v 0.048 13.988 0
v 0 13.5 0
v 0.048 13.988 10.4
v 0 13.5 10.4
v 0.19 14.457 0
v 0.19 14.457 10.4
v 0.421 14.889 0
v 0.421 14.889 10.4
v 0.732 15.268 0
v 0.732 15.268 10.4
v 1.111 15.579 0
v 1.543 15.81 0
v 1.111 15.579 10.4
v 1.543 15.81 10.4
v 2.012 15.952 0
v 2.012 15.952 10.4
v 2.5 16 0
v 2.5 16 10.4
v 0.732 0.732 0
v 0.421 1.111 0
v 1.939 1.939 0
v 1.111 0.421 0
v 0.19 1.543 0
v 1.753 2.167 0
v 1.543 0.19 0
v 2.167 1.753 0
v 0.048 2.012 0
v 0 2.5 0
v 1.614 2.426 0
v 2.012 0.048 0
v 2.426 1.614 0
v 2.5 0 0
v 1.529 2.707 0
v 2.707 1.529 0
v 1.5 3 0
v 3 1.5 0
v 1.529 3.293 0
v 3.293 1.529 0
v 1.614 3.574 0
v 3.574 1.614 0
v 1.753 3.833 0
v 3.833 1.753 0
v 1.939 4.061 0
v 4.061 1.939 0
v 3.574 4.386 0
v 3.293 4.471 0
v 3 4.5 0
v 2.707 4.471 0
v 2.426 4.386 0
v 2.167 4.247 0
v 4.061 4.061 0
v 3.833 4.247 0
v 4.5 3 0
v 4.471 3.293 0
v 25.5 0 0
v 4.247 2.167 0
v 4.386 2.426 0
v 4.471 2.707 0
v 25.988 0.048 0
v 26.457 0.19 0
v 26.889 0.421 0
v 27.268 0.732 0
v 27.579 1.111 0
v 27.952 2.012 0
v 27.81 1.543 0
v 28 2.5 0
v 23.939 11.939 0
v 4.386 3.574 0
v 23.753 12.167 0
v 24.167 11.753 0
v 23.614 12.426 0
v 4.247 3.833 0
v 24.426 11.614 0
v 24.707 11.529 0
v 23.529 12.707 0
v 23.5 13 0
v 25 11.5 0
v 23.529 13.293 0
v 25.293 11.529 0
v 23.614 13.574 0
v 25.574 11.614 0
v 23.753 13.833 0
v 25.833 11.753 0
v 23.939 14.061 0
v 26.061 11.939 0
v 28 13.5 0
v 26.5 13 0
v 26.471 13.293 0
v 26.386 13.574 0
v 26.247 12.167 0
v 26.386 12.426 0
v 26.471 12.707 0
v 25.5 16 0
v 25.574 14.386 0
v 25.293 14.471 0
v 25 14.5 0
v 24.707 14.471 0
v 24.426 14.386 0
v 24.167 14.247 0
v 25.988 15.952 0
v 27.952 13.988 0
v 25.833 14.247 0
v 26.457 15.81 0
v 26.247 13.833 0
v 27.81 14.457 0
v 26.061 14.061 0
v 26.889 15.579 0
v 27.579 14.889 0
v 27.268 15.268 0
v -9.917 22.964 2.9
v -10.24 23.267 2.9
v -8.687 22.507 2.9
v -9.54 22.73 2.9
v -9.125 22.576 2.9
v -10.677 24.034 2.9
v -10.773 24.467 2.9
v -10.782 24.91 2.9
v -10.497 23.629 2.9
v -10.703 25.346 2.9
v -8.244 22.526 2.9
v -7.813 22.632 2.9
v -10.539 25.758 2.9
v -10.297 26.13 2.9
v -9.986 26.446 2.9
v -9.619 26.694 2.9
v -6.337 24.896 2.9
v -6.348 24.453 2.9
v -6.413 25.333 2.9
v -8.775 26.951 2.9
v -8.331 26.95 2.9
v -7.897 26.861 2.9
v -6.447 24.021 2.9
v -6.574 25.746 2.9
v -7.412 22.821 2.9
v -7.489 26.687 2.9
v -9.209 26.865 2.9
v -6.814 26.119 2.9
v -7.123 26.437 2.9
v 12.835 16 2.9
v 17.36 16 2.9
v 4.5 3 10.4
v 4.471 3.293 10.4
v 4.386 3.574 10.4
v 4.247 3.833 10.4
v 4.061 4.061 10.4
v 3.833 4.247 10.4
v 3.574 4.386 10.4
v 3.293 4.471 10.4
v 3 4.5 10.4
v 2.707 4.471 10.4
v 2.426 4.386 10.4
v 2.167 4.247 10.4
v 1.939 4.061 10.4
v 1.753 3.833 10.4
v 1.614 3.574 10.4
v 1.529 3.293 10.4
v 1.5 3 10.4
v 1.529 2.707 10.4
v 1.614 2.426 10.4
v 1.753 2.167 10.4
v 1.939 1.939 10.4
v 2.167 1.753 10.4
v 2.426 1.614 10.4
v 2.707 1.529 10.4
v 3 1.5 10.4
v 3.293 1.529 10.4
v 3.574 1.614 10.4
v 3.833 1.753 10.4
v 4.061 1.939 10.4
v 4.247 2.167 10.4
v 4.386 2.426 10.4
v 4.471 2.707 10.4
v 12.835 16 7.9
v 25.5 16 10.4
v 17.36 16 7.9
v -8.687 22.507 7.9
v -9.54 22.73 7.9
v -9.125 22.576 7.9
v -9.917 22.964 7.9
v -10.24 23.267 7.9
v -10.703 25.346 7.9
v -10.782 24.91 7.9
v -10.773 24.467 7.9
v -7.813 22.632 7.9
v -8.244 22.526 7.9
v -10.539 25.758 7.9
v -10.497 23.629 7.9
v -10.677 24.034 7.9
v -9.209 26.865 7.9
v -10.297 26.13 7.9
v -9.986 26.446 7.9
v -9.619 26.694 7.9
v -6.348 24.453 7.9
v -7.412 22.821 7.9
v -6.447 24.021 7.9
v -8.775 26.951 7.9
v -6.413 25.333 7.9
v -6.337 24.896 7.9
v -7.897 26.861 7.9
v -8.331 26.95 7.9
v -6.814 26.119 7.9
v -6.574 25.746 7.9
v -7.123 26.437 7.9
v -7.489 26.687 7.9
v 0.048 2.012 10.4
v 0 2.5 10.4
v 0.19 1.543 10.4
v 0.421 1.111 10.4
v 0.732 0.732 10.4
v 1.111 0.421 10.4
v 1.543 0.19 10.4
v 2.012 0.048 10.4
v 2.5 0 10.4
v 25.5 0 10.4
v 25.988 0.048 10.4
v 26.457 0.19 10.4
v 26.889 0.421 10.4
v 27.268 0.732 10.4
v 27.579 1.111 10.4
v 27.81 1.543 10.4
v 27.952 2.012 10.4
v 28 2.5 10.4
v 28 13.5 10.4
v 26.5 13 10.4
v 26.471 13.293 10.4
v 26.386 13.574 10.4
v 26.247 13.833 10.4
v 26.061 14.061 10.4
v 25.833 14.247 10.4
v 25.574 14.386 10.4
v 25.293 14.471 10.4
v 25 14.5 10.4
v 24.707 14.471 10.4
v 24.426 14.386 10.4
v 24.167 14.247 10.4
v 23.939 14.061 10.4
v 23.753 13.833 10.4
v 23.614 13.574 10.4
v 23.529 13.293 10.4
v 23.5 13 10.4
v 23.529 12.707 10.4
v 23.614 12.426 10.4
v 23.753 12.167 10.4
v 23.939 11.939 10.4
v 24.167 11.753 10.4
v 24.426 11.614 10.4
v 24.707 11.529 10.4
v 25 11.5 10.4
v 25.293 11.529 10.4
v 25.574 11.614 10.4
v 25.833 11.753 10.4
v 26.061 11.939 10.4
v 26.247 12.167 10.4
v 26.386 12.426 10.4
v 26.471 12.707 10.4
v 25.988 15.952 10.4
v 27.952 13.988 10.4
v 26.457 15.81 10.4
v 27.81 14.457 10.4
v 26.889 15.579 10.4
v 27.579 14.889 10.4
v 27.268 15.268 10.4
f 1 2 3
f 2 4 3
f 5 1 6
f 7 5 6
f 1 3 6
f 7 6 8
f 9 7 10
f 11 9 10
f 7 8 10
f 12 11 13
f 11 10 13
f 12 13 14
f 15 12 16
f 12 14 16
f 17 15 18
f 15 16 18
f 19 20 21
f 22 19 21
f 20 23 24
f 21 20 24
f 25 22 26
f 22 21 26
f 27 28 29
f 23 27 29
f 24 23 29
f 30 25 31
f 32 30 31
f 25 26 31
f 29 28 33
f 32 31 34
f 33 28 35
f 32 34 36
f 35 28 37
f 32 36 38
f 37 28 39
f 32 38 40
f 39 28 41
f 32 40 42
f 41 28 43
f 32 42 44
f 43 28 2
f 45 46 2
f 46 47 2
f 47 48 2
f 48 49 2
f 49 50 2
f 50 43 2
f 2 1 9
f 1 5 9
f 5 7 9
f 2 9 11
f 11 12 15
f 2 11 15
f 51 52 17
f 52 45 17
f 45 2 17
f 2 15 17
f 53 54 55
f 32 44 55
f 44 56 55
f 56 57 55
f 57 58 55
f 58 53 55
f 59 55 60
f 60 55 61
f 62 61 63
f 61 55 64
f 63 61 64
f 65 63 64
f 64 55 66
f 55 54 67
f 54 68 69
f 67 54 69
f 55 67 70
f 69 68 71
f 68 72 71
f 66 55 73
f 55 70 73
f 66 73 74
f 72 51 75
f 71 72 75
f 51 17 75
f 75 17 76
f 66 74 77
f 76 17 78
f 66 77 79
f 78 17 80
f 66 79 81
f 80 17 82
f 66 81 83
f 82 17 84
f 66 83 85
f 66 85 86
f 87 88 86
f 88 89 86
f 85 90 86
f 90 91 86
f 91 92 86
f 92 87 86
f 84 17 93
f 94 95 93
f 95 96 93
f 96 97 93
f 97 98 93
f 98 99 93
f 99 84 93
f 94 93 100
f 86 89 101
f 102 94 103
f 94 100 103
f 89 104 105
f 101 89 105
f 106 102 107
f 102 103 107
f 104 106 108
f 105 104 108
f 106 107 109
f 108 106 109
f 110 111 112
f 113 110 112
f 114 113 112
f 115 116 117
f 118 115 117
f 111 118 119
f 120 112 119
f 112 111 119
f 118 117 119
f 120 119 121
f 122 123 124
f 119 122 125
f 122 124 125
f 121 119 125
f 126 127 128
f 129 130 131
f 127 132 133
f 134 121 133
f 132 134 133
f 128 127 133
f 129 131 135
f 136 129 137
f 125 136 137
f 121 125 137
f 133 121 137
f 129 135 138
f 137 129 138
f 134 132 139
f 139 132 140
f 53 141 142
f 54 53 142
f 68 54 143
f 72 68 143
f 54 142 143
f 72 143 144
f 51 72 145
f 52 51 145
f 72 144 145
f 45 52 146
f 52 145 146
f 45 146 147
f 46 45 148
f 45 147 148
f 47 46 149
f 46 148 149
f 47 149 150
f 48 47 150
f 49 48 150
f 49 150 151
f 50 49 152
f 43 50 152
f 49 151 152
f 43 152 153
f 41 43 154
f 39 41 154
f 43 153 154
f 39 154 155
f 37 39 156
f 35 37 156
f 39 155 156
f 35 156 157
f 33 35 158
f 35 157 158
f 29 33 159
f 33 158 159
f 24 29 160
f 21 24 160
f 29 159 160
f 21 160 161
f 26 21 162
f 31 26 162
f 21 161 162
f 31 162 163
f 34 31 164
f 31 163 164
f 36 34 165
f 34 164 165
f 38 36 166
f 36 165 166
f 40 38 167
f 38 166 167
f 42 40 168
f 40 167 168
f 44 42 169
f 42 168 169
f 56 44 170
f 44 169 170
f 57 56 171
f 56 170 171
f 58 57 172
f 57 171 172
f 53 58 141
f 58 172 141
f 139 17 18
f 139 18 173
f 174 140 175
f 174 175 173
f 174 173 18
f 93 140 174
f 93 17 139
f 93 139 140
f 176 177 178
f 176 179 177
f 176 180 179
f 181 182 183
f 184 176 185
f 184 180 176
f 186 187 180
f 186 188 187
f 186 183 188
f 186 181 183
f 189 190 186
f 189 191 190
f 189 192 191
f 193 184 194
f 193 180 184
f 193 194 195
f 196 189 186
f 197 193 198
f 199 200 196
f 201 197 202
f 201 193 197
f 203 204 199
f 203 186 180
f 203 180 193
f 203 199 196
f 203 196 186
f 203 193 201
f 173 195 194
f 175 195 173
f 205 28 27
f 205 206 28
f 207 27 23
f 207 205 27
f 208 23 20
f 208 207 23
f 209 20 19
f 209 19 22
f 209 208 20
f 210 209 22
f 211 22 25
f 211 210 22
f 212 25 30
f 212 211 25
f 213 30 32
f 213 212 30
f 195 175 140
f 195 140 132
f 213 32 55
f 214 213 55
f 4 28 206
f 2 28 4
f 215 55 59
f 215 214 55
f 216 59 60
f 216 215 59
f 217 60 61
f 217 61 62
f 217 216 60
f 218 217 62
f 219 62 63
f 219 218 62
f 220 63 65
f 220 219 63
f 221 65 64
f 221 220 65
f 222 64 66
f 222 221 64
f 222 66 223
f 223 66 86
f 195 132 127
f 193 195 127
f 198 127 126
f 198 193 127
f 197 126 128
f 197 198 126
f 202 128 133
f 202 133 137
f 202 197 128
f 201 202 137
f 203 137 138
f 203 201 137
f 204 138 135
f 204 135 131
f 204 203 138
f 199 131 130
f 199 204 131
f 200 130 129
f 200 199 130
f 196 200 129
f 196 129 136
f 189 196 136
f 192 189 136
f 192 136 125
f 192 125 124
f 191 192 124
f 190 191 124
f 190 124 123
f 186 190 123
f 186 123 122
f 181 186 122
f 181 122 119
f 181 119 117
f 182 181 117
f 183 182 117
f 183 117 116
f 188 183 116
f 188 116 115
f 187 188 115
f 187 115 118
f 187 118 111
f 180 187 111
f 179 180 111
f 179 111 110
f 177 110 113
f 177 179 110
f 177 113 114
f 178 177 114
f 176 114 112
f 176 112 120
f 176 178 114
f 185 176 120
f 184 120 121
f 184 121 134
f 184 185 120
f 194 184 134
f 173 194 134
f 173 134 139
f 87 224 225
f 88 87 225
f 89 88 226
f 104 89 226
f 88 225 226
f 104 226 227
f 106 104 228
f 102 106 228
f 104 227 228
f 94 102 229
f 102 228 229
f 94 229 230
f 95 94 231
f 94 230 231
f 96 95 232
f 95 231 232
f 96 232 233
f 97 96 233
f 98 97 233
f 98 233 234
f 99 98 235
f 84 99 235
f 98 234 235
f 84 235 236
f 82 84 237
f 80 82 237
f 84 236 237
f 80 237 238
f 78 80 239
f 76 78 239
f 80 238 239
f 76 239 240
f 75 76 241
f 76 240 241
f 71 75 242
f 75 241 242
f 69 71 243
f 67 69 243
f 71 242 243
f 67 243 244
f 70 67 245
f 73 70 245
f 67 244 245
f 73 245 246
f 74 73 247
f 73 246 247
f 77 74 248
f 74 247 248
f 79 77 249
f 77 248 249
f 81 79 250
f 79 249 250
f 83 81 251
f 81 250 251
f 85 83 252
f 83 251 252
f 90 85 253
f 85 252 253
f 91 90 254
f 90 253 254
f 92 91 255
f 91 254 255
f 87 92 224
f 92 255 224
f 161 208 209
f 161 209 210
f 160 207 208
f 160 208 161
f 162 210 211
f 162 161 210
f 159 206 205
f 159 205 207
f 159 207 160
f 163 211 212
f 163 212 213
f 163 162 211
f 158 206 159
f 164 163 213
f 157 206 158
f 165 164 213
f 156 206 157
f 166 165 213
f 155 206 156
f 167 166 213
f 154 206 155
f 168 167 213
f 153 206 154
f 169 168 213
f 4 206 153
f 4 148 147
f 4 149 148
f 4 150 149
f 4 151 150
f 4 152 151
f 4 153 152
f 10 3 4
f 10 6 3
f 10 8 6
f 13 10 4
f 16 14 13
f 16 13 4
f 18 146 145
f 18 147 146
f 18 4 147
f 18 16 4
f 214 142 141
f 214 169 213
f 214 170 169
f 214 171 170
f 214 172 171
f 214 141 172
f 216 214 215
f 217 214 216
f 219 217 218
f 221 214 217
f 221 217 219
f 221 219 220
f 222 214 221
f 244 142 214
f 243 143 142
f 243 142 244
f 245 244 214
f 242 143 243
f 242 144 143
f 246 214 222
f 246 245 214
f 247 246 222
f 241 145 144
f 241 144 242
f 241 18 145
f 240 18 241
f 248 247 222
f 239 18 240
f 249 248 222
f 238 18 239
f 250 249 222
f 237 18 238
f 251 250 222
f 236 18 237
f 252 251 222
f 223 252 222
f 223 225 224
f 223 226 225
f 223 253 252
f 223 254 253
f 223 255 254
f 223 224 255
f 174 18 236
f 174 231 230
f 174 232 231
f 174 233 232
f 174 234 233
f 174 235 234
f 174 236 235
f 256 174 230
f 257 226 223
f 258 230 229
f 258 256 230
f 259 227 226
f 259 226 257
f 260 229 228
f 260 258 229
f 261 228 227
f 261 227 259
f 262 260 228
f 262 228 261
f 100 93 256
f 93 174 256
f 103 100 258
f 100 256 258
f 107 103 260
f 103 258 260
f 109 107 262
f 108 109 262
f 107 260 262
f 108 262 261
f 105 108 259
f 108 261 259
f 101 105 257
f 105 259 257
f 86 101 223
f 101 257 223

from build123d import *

# Parameters (mm, degrees)
SZKIC1_W                    = 28
SZKIC1_H                    = 16
DODANIE_WYCI_GNI_CIE1_DEPTH = 10.4
SZKIC2_R                    = 1.5
WYTNIJ_WYCI_GNI_CIE1_DEPTH  = 10.4
ZAOKR_GLENIE1_R             = 2.5
DODANIE_WYCI_GNI_CIE2_START = -2.5
DODANIE_WYCI_GNI_CIE2_DEPTH = 5
SZKIC5_R                    = 2.229172114
DODANIE_WYCI_GNI_CIE3_DEPTH = 5


with BuildPart() as part:
    # Szkic1 → Dodanie-wyciągnięcie1 (new body)
    with BuildSketch(Plane.XY):
        with Locations((14, 8)):
            Rectangle(SZKIC1_W, SZKIC1_H)
    extrude(amount=DODANIE_WYCI_GNI_CIE1_DEPTH)

    # Szkic2 → Wytnij-wyciągnięcie1 (cut)
    with BuildSketch(Plane.XY.offset(10.4)):
        with Locations((3, 3)):
            Circle(SZKIC2_R)
        with Locations((25, 13)):
            Circle(SZKIC2_R)
    extrude(amount=-WYTNIJ_WYCI_GNI_CIE1_DEPTH, mode=Mode.SUBTRACT)

    # Zaokrąglenie1
    zaokr_glenie1_edges = [part.edges().sort_by_distance(p)[0] for p in [
        (0, 16, 5.2),
        (28, 16, 5.2),
        (28, 0, 5.2),
        (0, 0, 5.2),
    ]]
    fillet(zaokr_glenie1_edges, radius=ZAOKR_GLENIE1_R)

    # Szkic4 → Dodanie-wyciągnięcie2 (add)
    with BuildSketch(Plane.XY.offset(10.4).offset(DODANIE_WYCI_GNI_CIE2_START)):
        Polygon((17.360184227, 16), (-9.374532536, 25.006750185), (-9.835766296, 23.637671029), (15.248549739, 15.186929991), align=None)
    extrude(amount=-DODANIE_WYCI_GNI_CIE2_DEPTH)

    # Szkic5 → Dodanie-wyciągnięcie3 (add)
    with BuildSketch(Plane.XY.offset(7.9)):
        with Locations((-8.559972621, 24.732330309)):
            Circle(SZKIC5_R)
    extrude(amount=-DODANIE_WYCI_GNI_CIE3_DEPTH)


solid = part.part
